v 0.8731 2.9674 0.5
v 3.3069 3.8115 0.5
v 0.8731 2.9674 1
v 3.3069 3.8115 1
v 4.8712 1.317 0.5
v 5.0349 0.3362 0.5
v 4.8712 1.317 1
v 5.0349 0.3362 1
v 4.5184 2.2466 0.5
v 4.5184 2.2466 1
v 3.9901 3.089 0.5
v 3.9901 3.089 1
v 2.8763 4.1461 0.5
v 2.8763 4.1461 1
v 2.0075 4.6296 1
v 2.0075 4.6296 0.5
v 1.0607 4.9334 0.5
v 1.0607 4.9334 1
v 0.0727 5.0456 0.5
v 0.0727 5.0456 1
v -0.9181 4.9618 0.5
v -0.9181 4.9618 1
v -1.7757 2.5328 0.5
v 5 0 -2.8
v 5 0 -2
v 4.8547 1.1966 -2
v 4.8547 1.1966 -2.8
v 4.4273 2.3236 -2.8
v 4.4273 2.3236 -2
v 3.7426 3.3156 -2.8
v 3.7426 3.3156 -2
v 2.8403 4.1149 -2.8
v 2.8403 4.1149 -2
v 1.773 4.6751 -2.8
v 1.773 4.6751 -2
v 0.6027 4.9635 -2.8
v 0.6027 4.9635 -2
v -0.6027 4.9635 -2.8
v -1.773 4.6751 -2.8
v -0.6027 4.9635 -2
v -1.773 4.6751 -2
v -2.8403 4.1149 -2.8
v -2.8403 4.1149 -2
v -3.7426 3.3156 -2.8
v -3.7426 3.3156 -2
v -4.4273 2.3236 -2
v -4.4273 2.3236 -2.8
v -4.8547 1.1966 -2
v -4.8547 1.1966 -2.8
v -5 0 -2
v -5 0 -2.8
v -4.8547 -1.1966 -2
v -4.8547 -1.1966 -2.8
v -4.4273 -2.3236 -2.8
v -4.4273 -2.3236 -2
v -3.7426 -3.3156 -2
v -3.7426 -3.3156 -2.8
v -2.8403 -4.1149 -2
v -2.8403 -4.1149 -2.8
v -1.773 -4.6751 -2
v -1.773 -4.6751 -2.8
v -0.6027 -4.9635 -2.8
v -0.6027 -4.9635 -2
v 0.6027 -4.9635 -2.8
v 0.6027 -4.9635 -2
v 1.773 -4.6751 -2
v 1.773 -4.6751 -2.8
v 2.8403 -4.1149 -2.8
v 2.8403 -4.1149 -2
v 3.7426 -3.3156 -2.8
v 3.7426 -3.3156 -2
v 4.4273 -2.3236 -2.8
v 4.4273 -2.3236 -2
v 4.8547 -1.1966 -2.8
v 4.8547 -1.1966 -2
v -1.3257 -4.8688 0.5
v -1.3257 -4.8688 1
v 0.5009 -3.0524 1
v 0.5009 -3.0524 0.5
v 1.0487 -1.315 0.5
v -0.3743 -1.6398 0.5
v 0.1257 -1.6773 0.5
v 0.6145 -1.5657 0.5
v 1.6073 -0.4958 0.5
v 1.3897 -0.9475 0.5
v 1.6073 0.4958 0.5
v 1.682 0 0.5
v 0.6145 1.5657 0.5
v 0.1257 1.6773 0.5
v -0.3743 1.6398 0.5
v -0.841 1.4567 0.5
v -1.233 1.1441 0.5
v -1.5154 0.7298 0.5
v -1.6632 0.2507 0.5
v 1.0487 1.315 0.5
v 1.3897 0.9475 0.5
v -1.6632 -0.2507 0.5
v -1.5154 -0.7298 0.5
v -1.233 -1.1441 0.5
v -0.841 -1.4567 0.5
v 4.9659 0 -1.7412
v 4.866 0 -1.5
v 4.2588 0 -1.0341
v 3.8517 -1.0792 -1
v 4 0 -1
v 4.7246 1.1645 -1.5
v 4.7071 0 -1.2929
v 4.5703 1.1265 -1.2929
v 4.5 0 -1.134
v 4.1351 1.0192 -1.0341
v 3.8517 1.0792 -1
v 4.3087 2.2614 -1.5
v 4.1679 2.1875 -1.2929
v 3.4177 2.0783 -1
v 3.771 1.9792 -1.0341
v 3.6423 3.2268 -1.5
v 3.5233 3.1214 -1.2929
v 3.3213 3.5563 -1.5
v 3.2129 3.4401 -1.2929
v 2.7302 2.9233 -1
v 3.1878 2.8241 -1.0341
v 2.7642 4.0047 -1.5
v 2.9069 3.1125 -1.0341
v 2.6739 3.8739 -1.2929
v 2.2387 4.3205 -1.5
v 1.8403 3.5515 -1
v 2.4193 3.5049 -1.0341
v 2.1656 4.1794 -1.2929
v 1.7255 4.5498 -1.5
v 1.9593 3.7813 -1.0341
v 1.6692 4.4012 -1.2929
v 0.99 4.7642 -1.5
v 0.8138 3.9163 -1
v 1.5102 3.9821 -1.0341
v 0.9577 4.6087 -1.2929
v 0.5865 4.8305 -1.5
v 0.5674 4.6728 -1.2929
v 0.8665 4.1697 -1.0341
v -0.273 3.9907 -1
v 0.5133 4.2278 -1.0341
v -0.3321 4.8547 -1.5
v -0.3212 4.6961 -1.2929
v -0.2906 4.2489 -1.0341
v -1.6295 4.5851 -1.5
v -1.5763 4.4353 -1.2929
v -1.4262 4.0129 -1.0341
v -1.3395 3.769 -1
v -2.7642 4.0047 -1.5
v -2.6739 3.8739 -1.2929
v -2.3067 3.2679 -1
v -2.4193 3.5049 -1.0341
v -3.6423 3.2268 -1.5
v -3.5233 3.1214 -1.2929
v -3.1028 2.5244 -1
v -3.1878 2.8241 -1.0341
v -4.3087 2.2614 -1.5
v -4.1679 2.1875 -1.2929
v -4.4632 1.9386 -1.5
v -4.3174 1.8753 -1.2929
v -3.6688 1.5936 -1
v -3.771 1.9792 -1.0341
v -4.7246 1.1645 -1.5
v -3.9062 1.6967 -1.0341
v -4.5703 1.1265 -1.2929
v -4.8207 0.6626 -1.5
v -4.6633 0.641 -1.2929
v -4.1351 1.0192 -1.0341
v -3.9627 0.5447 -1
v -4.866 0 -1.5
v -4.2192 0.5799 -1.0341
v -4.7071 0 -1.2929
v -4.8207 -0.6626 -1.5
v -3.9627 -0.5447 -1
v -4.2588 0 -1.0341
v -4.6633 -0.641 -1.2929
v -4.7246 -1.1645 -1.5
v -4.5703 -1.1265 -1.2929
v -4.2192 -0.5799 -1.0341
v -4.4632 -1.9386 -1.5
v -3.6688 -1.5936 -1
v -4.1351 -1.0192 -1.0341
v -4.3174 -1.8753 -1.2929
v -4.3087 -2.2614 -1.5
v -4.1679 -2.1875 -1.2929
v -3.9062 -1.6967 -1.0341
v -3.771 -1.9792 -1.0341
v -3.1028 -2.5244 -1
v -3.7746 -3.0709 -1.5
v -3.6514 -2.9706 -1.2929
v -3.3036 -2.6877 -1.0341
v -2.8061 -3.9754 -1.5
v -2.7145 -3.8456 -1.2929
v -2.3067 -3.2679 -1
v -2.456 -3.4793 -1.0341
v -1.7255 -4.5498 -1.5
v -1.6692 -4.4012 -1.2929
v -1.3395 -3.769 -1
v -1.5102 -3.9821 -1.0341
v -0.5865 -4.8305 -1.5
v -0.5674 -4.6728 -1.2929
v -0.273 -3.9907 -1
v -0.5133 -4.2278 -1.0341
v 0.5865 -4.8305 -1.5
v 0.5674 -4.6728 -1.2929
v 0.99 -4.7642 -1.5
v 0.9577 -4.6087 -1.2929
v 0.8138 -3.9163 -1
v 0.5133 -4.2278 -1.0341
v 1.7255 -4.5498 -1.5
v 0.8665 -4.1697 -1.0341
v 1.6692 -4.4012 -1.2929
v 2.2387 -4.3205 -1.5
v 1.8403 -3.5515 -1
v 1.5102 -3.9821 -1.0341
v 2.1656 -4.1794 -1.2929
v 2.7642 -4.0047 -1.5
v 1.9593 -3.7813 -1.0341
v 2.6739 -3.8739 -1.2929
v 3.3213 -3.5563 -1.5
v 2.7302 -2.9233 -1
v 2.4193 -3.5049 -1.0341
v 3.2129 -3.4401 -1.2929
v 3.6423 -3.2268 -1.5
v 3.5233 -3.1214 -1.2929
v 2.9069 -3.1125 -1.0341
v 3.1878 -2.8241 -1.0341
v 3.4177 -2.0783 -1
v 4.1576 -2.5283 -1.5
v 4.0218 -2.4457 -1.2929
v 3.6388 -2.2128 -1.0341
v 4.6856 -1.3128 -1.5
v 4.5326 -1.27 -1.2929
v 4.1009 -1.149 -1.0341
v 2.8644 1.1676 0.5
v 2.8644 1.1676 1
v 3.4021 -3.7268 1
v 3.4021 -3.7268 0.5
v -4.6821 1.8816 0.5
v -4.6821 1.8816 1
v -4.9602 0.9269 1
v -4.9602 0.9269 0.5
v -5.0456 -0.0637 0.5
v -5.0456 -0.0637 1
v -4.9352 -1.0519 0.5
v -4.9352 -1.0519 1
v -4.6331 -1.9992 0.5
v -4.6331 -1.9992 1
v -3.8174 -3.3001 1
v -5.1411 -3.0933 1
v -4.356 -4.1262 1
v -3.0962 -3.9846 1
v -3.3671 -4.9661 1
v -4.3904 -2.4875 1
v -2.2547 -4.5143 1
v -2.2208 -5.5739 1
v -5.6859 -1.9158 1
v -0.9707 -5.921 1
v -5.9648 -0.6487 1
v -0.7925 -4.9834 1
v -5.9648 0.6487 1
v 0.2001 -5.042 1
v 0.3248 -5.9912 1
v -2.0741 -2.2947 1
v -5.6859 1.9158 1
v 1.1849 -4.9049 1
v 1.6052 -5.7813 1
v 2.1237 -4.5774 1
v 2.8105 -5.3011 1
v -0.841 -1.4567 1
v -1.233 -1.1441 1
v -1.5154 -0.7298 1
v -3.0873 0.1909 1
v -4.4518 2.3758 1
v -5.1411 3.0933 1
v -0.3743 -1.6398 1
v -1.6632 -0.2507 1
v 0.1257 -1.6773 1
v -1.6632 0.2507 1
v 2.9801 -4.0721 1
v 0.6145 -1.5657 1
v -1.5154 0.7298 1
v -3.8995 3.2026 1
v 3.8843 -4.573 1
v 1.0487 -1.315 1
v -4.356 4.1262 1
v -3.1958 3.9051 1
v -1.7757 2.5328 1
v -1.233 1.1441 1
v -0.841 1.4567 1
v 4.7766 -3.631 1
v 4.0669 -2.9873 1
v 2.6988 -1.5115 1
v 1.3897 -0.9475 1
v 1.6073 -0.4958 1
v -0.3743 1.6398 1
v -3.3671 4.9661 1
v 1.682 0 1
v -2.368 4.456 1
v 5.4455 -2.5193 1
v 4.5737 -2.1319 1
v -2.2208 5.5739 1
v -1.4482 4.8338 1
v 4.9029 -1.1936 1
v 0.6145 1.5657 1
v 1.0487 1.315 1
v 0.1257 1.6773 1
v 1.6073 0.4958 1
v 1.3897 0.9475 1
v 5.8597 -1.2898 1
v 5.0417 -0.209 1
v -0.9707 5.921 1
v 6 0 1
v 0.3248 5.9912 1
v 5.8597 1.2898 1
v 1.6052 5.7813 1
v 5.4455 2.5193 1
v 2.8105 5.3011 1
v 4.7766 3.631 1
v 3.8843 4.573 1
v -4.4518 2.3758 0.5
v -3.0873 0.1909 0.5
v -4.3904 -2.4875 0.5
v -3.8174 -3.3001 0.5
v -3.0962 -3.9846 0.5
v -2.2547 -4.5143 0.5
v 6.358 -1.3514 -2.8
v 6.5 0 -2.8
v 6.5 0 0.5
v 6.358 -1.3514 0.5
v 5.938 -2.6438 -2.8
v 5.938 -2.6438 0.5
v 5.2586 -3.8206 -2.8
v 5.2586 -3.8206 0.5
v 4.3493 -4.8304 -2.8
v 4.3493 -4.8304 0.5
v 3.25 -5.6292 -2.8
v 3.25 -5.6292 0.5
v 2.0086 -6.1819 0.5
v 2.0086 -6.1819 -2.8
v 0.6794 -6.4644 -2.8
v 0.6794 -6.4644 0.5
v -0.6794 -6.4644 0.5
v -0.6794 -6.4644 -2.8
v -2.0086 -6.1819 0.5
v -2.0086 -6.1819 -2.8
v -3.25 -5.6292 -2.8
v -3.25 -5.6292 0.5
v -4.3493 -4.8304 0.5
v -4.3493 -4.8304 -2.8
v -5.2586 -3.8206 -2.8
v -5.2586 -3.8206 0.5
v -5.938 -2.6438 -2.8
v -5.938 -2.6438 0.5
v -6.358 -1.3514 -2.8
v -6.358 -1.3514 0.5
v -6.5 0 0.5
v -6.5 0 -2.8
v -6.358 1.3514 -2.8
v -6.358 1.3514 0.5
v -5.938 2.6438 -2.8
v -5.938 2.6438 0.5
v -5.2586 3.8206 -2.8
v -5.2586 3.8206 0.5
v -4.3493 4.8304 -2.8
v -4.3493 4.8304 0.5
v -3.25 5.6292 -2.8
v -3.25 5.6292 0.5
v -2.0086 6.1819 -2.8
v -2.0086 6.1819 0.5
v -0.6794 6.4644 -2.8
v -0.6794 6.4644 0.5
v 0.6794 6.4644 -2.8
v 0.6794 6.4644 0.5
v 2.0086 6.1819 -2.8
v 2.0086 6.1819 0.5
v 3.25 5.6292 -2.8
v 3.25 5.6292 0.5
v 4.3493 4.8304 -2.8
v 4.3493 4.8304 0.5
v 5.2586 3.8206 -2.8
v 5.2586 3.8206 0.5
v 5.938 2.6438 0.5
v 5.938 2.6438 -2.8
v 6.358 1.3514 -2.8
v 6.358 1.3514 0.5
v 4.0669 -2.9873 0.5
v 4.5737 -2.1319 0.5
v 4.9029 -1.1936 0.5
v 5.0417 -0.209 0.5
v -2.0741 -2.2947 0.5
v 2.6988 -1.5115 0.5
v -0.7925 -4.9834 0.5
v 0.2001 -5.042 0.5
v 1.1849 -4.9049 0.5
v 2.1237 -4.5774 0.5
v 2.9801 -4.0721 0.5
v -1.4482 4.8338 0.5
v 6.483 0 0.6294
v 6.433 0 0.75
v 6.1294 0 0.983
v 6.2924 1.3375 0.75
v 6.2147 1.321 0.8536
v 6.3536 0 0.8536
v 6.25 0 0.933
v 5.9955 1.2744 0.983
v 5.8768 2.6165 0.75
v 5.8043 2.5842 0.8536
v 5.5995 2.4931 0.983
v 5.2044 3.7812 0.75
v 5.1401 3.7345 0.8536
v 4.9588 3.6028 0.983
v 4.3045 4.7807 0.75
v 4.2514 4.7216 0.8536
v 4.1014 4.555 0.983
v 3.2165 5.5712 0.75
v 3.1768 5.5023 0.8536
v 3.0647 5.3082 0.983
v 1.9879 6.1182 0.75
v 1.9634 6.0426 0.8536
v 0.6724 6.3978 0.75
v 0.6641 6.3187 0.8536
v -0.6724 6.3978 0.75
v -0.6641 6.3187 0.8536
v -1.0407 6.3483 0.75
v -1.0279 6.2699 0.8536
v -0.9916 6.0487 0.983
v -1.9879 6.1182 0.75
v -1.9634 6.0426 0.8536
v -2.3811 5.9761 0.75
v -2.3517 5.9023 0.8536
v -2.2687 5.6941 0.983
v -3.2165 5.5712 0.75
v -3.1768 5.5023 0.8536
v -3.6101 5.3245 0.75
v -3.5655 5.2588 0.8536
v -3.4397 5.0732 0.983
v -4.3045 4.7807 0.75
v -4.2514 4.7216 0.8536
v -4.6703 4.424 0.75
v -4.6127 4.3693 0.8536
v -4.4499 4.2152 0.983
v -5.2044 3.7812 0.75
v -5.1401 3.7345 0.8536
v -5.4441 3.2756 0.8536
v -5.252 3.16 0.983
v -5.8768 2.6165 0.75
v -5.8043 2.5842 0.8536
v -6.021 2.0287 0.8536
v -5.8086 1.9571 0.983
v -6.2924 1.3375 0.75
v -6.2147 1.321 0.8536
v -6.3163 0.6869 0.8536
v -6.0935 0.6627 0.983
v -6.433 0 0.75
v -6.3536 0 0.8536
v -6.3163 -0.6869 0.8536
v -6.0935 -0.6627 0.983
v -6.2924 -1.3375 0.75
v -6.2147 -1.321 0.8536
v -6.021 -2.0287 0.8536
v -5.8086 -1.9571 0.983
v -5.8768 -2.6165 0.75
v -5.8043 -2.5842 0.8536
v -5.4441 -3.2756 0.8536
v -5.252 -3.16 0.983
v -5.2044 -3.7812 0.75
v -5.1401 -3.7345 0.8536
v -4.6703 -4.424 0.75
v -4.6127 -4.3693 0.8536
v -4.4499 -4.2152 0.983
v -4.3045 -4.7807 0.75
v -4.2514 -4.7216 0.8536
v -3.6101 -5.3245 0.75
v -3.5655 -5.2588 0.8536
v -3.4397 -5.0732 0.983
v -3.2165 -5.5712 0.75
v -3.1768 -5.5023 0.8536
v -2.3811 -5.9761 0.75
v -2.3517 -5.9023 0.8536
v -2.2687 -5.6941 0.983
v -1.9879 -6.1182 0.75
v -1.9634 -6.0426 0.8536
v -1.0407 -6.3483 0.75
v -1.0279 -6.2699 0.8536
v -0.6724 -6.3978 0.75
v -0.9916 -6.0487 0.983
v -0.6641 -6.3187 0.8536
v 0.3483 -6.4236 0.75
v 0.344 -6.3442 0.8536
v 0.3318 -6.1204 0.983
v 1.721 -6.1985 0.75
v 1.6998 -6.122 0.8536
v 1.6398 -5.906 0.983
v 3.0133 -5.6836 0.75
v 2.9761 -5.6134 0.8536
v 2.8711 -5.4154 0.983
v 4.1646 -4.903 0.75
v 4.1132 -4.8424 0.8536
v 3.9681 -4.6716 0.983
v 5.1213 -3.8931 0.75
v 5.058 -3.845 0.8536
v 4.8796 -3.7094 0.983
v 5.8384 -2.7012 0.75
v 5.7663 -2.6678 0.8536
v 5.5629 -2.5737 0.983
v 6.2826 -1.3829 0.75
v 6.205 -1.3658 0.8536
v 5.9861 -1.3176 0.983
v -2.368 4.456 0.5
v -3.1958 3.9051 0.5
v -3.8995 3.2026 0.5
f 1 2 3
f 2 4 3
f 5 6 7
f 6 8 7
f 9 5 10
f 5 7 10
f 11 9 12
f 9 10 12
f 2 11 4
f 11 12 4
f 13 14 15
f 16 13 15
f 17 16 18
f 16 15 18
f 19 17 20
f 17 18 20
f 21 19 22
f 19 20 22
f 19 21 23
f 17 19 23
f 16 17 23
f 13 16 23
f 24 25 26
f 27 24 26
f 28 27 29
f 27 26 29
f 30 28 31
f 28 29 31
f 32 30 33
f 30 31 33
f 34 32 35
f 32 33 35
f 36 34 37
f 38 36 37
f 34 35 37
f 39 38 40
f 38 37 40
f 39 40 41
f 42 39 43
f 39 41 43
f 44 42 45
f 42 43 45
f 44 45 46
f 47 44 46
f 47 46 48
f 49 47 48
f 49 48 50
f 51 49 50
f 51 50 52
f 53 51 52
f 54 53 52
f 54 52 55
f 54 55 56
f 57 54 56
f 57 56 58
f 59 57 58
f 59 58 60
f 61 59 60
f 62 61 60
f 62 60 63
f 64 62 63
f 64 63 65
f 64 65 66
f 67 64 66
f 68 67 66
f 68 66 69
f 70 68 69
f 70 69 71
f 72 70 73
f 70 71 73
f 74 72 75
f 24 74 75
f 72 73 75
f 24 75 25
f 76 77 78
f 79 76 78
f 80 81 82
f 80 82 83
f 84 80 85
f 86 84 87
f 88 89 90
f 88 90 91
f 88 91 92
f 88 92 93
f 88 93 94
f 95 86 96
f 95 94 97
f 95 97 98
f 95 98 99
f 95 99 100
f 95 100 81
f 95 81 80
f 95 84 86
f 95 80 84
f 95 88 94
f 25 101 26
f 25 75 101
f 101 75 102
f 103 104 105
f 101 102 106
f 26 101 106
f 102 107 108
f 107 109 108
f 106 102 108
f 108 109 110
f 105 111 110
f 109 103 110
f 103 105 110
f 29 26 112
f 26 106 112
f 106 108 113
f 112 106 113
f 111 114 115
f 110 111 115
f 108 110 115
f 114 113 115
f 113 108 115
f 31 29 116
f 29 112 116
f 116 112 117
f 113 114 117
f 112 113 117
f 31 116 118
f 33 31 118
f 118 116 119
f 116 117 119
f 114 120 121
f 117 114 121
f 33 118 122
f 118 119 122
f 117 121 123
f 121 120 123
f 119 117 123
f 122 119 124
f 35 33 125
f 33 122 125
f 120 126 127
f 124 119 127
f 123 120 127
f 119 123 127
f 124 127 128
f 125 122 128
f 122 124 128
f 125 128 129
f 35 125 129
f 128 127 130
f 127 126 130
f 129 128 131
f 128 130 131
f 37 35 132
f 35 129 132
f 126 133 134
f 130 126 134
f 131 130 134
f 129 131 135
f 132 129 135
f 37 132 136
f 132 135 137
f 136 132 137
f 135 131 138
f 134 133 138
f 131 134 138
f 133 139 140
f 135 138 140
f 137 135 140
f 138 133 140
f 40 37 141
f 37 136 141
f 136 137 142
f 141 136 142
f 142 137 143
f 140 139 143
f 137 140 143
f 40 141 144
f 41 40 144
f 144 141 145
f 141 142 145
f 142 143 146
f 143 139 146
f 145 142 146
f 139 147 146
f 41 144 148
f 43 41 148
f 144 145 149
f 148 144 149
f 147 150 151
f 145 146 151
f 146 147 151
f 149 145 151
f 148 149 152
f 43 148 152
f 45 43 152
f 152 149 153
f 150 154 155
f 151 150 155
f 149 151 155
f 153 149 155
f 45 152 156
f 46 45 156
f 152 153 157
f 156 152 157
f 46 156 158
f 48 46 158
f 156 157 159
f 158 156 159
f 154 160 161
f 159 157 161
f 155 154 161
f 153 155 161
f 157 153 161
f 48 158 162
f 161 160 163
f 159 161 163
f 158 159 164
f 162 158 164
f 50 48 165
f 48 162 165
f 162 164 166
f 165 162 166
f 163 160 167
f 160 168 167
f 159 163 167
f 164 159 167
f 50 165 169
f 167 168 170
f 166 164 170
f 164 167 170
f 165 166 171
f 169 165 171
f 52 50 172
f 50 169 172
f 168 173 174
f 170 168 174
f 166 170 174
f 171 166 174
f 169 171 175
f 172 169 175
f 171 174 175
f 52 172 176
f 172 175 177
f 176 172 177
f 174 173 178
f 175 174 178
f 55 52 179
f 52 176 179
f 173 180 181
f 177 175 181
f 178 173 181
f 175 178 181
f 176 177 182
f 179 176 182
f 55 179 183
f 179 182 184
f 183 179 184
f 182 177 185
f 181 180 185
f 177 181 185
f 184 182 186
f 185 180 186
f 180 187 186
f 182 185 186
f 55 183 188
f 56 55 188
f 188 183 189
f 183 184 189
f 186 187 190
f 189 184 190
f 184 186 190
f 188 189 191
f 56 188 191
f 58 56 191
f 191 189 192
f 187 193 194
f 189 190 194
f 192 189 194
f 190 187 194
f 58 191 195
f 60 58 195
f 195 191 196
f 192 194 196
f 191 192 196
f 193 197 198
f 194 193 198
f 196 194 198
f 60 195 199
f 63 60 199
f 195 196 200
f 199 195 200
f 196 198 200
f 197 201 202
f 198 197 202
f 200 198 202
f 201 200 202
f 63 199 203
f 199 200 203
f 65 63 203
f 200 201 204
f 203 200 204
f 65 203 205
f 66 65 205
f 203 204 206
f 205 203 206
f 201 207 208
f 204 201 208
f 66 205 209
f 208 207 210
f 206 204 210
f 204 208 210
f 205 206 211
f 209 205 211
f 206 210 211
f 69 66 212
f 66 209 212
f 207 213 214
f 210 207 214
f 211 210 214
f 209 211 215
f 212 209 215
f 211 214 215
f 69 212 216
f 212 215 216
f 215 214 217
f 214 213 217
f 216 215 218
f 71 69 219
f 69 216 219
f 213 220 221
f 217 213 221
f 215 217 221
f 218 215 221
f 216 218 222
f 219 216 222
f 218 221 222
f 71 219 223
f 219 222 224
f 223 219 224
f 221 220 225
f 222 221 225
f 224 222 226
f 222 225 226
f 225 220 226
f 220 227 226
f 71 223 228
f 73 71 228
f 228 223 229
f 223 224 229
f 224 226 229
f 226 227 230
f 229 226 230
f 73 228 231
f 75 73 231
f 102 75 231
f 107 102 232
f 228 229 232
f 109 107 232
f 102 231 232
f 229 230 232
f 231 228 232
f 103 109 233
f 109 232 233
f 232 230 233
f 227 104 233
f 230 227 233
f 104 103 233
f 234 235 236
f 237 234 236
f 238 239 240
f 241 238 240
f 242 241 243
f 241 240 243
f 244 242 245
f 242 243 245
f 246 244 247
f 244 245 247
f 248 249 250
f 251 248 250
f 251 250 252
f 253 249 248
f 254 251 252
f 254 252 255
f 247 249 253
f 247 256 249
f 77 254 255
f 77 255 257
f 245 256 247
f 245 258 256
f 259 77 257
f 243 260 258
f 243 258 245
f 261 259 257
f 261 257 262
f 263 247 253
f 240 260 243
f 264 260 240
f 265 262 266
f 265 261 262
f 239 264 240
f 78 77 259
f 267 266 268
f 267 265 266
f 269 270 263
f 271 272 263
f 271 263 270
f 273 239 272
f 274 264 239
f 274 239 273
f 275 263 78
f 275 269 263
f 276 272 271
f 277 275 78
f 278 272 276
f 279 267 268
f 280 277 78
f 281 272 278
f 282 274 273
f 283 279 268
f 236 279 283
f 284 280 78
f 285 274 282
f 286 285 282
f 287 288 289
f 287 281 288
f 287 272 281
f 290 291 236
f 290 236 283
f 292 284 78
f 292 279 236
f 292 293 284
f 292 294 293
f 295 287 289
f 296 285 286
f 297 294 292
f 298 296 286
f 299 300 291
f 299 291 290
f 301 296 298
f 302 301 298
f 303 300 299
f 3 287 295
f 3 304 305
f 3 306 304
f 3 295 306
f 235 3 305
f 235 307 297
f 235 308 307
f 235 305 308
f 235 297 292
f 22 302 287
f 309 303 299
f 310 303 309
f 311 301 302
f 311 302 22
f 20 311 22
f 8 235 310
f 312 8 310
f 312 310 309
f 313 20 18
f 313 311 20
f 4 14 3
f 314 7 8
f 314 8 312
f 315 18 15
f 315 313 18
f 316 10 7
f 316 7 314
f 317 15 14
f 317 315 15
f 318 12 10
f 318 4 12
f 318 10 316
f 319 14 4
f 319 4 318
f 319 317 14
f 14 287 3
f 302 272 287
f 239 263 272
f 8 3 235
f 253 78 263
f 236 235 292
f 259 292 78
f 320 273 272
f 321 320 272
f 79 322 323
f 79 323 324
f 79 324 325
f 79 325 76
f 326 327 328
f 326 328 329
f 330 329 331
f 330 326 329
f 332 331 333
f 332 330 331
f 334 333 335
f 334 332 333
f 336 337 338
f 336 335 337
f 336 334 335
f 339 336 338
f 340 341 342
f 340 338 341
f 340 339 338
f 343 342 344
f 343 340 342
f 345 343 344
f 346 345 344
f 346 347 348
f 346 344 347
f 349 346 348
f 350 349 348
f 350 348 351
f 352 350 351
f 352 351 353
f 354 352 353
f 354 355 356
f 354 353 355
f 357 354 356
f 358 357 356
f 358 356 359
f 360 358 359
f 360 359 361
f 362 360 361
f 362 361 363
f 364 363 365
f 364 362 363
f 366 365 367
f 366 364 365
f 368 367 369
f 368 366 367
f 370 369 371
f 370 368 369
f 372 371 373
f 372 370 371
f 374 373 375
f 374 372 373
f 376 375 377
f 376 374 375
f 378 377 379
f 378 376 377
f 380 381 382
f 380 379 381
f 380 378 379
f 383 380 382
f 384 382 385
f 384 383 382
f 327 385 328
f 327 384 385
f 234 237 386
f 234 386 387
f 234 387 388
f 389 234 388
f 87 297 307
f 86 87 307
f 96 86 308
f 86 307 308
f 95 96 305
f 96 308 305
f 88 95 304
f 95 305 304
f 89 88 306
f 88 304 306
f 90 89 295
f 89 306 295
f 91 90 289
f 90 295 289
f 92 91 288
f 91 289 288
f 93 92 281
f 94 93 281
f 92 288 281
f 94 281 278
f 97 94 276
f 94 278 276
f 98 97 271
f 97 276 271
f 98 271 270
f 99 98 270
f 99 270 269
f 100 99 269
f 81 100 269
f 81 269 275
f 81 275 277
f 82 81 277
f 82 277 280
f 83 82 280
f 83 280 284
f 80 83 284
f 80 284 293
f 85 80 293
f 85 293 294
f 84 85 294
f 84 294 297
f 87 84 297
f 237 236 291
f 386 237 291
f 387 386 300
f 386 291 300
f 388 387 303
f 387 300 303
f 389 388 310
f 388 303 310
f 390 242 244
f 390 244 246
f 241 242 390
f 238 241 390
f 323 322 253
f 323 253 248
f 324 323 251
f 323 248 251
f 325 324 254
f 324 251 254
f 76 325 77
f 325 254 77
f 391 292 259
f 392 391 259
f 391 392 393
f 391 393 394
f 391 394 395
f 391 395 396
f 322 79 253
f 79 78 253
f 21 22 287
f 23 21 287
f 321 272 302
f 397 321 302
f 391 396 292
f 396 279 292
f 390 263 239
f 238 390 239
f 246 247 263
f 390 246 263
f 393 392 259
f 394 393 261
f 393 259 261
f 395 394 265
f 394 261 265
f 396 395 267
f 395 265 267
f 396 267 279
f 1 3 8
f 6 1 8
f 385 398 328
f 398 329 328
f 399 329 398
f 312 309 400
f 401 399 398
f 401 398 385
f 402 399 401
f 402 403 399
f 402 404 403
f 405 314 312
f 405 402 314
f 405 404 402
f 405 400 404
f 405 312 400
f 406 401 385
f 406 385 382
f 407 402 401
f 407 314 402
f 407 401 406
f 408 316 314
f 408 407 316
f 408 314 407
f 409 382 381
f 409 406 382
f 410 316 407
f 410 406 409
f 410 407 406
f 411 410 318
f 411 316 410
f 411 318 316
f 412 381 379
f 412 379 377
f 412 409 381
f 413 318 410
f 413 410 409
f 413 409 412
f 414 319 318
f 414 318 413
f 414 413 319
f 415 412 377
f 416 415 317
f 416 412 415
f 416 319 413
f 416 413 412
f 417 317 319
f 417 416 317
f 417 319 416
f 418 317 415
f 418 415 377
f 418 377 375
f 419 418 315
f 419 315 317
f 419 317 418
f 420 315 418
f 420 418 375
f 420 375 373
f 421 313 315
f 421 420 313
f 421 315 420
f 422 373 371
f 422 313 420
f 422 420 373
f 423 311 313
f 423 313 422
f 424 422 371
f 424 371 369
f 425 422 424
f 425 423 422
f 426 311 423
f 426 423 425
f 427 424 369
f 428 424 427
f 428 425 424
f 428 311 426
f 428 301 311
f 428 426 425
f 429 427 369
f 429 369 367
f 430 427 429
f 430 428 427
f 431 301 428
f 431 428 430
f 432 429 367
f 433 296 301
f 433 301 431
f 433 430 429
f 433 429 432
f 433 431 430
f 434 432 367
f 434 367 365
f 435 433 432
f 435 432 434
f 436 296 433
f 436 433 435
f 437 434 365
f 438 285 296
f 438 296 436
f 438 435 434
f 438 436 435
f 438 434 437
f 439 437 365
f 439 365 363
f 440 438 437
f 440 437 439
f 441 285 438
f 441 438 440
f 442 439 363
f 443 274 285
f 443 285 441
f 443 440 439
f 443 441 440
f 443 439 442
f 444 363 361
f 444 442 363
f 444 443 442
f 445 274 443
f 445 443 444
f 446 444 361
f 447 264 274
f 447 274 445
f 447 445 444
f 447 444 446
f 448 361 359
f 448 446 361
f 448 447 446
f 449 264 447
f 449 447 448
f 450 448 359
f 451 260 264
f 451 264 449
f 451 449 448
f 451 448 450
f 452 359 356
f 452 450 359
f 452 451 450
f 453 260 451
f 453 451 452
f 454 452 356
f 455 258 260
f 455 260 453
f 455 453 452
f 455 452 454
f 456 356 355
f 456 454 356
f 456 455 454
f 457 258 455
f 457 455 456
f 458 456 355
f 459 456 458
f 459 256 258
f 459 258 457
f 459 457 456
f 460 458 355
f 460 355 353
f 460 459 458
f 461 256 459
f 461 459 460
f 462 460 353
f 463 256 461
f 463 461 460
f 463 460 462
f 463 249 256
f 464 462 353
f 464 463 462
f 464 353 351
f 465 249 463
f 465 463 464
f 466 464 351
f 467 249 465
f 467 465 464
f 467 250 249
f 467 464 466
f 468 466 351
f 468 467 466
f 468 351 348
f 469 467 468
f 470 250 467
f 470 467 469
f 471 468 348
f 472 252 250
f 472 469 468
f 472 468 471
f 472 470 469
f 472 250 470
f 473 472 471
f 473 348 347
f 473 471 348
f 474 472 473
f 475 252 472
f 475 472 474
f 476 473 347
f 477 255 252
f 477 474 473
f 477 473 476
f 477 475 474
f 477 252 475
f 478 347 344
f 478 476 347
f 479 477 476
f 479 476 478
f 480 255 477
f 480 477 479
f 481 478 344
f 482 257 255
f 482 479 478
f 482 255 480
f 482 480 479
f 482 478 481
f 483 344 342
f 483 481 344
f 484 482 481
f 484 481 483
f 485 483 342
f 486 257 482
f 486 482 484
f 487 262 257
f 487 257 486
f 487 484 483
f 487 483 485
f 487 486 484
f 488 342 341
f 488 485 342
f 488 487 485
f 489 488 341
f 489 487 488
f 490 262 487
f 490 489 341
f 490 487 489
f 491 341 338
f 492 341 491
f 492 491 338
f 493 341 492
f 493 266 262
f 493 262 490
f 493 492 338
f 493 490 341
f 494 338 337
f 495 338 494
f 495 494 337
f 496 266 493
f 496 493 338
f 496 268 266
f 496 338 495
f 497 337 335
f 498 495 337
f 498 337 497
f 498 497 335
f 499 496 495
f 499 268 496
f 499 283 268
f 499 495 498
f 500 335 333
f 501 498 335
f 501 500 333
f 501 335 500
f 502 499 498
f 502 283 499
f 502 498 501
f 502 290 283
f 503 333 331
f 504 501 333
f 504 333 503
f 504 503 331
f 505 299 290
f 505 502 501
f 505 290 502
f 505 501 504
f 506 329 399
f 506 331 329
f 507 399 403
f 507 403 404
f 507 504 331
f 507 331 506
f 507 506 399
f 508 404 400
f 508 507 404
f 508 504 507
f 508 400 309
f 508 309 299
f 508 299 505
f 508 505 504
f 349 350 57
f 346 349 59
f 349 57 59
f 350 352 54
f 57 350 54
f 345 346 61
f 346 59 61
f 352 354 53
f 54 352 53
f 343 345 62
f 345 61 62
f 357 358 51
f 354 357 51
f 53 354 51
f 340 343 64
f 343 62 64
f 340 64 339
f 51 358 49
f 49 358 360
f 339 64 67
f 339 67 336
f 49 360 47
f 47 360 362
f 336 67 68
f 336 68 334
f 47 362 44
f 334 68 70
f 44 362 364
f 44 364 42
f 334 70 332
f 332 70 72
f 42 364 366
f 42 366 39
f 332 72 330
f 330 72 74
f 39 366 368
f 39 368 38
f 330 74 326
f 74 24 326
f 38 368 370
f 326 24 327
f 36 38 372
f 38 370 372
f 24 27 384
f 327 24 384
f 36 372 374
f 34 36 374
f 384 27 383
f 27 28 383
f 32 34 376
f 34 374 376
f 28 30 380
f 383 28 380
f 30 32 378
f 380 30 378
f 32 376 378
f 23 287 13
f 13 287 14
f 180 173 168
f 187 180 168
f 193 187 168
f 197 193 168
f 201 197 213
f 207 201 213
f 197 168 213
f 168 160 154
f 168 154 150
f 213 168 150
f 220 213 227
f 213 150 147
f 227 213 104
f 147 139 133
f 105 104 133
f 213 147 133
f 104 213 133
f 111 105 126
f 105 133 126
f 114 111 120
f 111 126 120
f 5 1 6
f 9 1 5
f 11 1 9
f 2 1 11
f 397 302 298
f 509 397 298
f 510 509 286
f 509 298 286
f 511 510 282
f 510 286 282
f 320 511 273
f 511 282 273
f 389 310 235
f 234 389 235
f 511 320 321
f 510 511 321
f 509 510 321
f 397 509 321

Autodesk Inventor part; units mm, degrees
ref_plane "YZ Plane" through (0, 0, 0) normal (1, 0, 0) x (0, 1, 0)
ref_plane "XZ Plane" through (0, 0, 0) normal (0, 1, 0) x (-1, 0, 0)
ref_plane "XY Plane" through (0, 0, 0) normal (0, 0, 1) x (1, 0, 0)
sketch "Sketch1" plane through (0, 0, 0) normal (0, 0, 1) x (1, 0, 0)
  circle A0 centre (0, 0) radius 6.5 projected
  circle A1 centre (0, 0) radius 5
  point P0 (0, 0)
  dimension "d0" = 1.5
extrude "Extrusion1" add sketch "Sketch1" against normal blind 2.8
sketch "Sketch2" plane through (0, 0, 0) normal (0, 0, 1) x (1, 0, 0)
  circle A0 centre (0, 0) radius 6.5 projected
  point P0 (0, 0)
extrude "Extrusion2" add sketch "Sketch2" along normal mid plane 2
fillet "Fillet1" radius 0.5 1 edges at (-6.5, 0, 1)
sketch "Sketch3" plane through (0, 0, 1) normal (0, 0, 1) x (1, 0, 0)
  line L0 (-1.7757, 2.5328) -> (2.8763, 4.1461) projected
  arc A0 (2.8763, 4.1461) -> (-0.9181, 4.9618) centre (0, 0) ccw projected
  line L1 (-0.9181, 4.9618) -> (-1.7757, 2.5328) projected
  line L2 (0.8731, 2.9674) -> (5.0349, 0.3362) projected
  arc A1 (5.0349, 0.3362) -> (3.3069, 3.8115) centre (0, 0) ccw projected
  line L3 (3.3069, 3.8115) -> (0.8731, 2.9674) projected
  line L4 (2.8644, 1.1676) -> (3.4021, -3.7268) projected
  arc A2 (3.4021, -3.7268) -> (5.0417, -0.209) centre (0, 0) ccw projected
  line L5 (5.0417, -0.209) -> (2.8644, 1.1676) projected
  circle A3 centre (0, 0) radius 1.682 projected
  line L6 (2.6988, -1.5115) -> (-0.7925, -4.9834) projected
  arc A4 (-0.7925, -4.9834) -> (2.9801, -4.0721) centre (0, 0) ccw projected
  line L7 (2.9801, -4.0721) -> (2.6988, -1.5115) projected
  line L8 (0.5009, -3.0524) -> (-4.3904, -2.4875) projected
  arc A5 (-4.3904, -2.4875) -> (-1.3257, -4.8688) centre (0, 0) ccw projected
  line L9 (-1.3257, -4.8688) -> (0.5009, -3.0524) projected
  line L10 (-2.0741, -2.2947) -> (-4.6821, 1.8816) projected
  arc A6 (-4.6821, 1.8816) -> (-4.6331, -1.9992) centre (0, 0) ccw projected
  line L11 (-4.6331, -1.9992) -> (-2.0741, -2.2947) projected
  line L12 (-3.0873, 0.1909) -> (-1.4482, 4.8338) projected
  arc A7 (-1.4482, 4.8338) -> (-4.4518, 2.3758) centre (0, 0) ccw projected
  line L13 (-4.4518, 2.3758) -> (-3.0873, 0.1909) projected
  point P0 (0, 0)
extrude "Extrusion3" cut sketch "Sketch3" against normal blind 0.5
fillet "Fillet2" radius 1 1 edges at (-5, 0, -1)
properties part number "bottom-cap"
